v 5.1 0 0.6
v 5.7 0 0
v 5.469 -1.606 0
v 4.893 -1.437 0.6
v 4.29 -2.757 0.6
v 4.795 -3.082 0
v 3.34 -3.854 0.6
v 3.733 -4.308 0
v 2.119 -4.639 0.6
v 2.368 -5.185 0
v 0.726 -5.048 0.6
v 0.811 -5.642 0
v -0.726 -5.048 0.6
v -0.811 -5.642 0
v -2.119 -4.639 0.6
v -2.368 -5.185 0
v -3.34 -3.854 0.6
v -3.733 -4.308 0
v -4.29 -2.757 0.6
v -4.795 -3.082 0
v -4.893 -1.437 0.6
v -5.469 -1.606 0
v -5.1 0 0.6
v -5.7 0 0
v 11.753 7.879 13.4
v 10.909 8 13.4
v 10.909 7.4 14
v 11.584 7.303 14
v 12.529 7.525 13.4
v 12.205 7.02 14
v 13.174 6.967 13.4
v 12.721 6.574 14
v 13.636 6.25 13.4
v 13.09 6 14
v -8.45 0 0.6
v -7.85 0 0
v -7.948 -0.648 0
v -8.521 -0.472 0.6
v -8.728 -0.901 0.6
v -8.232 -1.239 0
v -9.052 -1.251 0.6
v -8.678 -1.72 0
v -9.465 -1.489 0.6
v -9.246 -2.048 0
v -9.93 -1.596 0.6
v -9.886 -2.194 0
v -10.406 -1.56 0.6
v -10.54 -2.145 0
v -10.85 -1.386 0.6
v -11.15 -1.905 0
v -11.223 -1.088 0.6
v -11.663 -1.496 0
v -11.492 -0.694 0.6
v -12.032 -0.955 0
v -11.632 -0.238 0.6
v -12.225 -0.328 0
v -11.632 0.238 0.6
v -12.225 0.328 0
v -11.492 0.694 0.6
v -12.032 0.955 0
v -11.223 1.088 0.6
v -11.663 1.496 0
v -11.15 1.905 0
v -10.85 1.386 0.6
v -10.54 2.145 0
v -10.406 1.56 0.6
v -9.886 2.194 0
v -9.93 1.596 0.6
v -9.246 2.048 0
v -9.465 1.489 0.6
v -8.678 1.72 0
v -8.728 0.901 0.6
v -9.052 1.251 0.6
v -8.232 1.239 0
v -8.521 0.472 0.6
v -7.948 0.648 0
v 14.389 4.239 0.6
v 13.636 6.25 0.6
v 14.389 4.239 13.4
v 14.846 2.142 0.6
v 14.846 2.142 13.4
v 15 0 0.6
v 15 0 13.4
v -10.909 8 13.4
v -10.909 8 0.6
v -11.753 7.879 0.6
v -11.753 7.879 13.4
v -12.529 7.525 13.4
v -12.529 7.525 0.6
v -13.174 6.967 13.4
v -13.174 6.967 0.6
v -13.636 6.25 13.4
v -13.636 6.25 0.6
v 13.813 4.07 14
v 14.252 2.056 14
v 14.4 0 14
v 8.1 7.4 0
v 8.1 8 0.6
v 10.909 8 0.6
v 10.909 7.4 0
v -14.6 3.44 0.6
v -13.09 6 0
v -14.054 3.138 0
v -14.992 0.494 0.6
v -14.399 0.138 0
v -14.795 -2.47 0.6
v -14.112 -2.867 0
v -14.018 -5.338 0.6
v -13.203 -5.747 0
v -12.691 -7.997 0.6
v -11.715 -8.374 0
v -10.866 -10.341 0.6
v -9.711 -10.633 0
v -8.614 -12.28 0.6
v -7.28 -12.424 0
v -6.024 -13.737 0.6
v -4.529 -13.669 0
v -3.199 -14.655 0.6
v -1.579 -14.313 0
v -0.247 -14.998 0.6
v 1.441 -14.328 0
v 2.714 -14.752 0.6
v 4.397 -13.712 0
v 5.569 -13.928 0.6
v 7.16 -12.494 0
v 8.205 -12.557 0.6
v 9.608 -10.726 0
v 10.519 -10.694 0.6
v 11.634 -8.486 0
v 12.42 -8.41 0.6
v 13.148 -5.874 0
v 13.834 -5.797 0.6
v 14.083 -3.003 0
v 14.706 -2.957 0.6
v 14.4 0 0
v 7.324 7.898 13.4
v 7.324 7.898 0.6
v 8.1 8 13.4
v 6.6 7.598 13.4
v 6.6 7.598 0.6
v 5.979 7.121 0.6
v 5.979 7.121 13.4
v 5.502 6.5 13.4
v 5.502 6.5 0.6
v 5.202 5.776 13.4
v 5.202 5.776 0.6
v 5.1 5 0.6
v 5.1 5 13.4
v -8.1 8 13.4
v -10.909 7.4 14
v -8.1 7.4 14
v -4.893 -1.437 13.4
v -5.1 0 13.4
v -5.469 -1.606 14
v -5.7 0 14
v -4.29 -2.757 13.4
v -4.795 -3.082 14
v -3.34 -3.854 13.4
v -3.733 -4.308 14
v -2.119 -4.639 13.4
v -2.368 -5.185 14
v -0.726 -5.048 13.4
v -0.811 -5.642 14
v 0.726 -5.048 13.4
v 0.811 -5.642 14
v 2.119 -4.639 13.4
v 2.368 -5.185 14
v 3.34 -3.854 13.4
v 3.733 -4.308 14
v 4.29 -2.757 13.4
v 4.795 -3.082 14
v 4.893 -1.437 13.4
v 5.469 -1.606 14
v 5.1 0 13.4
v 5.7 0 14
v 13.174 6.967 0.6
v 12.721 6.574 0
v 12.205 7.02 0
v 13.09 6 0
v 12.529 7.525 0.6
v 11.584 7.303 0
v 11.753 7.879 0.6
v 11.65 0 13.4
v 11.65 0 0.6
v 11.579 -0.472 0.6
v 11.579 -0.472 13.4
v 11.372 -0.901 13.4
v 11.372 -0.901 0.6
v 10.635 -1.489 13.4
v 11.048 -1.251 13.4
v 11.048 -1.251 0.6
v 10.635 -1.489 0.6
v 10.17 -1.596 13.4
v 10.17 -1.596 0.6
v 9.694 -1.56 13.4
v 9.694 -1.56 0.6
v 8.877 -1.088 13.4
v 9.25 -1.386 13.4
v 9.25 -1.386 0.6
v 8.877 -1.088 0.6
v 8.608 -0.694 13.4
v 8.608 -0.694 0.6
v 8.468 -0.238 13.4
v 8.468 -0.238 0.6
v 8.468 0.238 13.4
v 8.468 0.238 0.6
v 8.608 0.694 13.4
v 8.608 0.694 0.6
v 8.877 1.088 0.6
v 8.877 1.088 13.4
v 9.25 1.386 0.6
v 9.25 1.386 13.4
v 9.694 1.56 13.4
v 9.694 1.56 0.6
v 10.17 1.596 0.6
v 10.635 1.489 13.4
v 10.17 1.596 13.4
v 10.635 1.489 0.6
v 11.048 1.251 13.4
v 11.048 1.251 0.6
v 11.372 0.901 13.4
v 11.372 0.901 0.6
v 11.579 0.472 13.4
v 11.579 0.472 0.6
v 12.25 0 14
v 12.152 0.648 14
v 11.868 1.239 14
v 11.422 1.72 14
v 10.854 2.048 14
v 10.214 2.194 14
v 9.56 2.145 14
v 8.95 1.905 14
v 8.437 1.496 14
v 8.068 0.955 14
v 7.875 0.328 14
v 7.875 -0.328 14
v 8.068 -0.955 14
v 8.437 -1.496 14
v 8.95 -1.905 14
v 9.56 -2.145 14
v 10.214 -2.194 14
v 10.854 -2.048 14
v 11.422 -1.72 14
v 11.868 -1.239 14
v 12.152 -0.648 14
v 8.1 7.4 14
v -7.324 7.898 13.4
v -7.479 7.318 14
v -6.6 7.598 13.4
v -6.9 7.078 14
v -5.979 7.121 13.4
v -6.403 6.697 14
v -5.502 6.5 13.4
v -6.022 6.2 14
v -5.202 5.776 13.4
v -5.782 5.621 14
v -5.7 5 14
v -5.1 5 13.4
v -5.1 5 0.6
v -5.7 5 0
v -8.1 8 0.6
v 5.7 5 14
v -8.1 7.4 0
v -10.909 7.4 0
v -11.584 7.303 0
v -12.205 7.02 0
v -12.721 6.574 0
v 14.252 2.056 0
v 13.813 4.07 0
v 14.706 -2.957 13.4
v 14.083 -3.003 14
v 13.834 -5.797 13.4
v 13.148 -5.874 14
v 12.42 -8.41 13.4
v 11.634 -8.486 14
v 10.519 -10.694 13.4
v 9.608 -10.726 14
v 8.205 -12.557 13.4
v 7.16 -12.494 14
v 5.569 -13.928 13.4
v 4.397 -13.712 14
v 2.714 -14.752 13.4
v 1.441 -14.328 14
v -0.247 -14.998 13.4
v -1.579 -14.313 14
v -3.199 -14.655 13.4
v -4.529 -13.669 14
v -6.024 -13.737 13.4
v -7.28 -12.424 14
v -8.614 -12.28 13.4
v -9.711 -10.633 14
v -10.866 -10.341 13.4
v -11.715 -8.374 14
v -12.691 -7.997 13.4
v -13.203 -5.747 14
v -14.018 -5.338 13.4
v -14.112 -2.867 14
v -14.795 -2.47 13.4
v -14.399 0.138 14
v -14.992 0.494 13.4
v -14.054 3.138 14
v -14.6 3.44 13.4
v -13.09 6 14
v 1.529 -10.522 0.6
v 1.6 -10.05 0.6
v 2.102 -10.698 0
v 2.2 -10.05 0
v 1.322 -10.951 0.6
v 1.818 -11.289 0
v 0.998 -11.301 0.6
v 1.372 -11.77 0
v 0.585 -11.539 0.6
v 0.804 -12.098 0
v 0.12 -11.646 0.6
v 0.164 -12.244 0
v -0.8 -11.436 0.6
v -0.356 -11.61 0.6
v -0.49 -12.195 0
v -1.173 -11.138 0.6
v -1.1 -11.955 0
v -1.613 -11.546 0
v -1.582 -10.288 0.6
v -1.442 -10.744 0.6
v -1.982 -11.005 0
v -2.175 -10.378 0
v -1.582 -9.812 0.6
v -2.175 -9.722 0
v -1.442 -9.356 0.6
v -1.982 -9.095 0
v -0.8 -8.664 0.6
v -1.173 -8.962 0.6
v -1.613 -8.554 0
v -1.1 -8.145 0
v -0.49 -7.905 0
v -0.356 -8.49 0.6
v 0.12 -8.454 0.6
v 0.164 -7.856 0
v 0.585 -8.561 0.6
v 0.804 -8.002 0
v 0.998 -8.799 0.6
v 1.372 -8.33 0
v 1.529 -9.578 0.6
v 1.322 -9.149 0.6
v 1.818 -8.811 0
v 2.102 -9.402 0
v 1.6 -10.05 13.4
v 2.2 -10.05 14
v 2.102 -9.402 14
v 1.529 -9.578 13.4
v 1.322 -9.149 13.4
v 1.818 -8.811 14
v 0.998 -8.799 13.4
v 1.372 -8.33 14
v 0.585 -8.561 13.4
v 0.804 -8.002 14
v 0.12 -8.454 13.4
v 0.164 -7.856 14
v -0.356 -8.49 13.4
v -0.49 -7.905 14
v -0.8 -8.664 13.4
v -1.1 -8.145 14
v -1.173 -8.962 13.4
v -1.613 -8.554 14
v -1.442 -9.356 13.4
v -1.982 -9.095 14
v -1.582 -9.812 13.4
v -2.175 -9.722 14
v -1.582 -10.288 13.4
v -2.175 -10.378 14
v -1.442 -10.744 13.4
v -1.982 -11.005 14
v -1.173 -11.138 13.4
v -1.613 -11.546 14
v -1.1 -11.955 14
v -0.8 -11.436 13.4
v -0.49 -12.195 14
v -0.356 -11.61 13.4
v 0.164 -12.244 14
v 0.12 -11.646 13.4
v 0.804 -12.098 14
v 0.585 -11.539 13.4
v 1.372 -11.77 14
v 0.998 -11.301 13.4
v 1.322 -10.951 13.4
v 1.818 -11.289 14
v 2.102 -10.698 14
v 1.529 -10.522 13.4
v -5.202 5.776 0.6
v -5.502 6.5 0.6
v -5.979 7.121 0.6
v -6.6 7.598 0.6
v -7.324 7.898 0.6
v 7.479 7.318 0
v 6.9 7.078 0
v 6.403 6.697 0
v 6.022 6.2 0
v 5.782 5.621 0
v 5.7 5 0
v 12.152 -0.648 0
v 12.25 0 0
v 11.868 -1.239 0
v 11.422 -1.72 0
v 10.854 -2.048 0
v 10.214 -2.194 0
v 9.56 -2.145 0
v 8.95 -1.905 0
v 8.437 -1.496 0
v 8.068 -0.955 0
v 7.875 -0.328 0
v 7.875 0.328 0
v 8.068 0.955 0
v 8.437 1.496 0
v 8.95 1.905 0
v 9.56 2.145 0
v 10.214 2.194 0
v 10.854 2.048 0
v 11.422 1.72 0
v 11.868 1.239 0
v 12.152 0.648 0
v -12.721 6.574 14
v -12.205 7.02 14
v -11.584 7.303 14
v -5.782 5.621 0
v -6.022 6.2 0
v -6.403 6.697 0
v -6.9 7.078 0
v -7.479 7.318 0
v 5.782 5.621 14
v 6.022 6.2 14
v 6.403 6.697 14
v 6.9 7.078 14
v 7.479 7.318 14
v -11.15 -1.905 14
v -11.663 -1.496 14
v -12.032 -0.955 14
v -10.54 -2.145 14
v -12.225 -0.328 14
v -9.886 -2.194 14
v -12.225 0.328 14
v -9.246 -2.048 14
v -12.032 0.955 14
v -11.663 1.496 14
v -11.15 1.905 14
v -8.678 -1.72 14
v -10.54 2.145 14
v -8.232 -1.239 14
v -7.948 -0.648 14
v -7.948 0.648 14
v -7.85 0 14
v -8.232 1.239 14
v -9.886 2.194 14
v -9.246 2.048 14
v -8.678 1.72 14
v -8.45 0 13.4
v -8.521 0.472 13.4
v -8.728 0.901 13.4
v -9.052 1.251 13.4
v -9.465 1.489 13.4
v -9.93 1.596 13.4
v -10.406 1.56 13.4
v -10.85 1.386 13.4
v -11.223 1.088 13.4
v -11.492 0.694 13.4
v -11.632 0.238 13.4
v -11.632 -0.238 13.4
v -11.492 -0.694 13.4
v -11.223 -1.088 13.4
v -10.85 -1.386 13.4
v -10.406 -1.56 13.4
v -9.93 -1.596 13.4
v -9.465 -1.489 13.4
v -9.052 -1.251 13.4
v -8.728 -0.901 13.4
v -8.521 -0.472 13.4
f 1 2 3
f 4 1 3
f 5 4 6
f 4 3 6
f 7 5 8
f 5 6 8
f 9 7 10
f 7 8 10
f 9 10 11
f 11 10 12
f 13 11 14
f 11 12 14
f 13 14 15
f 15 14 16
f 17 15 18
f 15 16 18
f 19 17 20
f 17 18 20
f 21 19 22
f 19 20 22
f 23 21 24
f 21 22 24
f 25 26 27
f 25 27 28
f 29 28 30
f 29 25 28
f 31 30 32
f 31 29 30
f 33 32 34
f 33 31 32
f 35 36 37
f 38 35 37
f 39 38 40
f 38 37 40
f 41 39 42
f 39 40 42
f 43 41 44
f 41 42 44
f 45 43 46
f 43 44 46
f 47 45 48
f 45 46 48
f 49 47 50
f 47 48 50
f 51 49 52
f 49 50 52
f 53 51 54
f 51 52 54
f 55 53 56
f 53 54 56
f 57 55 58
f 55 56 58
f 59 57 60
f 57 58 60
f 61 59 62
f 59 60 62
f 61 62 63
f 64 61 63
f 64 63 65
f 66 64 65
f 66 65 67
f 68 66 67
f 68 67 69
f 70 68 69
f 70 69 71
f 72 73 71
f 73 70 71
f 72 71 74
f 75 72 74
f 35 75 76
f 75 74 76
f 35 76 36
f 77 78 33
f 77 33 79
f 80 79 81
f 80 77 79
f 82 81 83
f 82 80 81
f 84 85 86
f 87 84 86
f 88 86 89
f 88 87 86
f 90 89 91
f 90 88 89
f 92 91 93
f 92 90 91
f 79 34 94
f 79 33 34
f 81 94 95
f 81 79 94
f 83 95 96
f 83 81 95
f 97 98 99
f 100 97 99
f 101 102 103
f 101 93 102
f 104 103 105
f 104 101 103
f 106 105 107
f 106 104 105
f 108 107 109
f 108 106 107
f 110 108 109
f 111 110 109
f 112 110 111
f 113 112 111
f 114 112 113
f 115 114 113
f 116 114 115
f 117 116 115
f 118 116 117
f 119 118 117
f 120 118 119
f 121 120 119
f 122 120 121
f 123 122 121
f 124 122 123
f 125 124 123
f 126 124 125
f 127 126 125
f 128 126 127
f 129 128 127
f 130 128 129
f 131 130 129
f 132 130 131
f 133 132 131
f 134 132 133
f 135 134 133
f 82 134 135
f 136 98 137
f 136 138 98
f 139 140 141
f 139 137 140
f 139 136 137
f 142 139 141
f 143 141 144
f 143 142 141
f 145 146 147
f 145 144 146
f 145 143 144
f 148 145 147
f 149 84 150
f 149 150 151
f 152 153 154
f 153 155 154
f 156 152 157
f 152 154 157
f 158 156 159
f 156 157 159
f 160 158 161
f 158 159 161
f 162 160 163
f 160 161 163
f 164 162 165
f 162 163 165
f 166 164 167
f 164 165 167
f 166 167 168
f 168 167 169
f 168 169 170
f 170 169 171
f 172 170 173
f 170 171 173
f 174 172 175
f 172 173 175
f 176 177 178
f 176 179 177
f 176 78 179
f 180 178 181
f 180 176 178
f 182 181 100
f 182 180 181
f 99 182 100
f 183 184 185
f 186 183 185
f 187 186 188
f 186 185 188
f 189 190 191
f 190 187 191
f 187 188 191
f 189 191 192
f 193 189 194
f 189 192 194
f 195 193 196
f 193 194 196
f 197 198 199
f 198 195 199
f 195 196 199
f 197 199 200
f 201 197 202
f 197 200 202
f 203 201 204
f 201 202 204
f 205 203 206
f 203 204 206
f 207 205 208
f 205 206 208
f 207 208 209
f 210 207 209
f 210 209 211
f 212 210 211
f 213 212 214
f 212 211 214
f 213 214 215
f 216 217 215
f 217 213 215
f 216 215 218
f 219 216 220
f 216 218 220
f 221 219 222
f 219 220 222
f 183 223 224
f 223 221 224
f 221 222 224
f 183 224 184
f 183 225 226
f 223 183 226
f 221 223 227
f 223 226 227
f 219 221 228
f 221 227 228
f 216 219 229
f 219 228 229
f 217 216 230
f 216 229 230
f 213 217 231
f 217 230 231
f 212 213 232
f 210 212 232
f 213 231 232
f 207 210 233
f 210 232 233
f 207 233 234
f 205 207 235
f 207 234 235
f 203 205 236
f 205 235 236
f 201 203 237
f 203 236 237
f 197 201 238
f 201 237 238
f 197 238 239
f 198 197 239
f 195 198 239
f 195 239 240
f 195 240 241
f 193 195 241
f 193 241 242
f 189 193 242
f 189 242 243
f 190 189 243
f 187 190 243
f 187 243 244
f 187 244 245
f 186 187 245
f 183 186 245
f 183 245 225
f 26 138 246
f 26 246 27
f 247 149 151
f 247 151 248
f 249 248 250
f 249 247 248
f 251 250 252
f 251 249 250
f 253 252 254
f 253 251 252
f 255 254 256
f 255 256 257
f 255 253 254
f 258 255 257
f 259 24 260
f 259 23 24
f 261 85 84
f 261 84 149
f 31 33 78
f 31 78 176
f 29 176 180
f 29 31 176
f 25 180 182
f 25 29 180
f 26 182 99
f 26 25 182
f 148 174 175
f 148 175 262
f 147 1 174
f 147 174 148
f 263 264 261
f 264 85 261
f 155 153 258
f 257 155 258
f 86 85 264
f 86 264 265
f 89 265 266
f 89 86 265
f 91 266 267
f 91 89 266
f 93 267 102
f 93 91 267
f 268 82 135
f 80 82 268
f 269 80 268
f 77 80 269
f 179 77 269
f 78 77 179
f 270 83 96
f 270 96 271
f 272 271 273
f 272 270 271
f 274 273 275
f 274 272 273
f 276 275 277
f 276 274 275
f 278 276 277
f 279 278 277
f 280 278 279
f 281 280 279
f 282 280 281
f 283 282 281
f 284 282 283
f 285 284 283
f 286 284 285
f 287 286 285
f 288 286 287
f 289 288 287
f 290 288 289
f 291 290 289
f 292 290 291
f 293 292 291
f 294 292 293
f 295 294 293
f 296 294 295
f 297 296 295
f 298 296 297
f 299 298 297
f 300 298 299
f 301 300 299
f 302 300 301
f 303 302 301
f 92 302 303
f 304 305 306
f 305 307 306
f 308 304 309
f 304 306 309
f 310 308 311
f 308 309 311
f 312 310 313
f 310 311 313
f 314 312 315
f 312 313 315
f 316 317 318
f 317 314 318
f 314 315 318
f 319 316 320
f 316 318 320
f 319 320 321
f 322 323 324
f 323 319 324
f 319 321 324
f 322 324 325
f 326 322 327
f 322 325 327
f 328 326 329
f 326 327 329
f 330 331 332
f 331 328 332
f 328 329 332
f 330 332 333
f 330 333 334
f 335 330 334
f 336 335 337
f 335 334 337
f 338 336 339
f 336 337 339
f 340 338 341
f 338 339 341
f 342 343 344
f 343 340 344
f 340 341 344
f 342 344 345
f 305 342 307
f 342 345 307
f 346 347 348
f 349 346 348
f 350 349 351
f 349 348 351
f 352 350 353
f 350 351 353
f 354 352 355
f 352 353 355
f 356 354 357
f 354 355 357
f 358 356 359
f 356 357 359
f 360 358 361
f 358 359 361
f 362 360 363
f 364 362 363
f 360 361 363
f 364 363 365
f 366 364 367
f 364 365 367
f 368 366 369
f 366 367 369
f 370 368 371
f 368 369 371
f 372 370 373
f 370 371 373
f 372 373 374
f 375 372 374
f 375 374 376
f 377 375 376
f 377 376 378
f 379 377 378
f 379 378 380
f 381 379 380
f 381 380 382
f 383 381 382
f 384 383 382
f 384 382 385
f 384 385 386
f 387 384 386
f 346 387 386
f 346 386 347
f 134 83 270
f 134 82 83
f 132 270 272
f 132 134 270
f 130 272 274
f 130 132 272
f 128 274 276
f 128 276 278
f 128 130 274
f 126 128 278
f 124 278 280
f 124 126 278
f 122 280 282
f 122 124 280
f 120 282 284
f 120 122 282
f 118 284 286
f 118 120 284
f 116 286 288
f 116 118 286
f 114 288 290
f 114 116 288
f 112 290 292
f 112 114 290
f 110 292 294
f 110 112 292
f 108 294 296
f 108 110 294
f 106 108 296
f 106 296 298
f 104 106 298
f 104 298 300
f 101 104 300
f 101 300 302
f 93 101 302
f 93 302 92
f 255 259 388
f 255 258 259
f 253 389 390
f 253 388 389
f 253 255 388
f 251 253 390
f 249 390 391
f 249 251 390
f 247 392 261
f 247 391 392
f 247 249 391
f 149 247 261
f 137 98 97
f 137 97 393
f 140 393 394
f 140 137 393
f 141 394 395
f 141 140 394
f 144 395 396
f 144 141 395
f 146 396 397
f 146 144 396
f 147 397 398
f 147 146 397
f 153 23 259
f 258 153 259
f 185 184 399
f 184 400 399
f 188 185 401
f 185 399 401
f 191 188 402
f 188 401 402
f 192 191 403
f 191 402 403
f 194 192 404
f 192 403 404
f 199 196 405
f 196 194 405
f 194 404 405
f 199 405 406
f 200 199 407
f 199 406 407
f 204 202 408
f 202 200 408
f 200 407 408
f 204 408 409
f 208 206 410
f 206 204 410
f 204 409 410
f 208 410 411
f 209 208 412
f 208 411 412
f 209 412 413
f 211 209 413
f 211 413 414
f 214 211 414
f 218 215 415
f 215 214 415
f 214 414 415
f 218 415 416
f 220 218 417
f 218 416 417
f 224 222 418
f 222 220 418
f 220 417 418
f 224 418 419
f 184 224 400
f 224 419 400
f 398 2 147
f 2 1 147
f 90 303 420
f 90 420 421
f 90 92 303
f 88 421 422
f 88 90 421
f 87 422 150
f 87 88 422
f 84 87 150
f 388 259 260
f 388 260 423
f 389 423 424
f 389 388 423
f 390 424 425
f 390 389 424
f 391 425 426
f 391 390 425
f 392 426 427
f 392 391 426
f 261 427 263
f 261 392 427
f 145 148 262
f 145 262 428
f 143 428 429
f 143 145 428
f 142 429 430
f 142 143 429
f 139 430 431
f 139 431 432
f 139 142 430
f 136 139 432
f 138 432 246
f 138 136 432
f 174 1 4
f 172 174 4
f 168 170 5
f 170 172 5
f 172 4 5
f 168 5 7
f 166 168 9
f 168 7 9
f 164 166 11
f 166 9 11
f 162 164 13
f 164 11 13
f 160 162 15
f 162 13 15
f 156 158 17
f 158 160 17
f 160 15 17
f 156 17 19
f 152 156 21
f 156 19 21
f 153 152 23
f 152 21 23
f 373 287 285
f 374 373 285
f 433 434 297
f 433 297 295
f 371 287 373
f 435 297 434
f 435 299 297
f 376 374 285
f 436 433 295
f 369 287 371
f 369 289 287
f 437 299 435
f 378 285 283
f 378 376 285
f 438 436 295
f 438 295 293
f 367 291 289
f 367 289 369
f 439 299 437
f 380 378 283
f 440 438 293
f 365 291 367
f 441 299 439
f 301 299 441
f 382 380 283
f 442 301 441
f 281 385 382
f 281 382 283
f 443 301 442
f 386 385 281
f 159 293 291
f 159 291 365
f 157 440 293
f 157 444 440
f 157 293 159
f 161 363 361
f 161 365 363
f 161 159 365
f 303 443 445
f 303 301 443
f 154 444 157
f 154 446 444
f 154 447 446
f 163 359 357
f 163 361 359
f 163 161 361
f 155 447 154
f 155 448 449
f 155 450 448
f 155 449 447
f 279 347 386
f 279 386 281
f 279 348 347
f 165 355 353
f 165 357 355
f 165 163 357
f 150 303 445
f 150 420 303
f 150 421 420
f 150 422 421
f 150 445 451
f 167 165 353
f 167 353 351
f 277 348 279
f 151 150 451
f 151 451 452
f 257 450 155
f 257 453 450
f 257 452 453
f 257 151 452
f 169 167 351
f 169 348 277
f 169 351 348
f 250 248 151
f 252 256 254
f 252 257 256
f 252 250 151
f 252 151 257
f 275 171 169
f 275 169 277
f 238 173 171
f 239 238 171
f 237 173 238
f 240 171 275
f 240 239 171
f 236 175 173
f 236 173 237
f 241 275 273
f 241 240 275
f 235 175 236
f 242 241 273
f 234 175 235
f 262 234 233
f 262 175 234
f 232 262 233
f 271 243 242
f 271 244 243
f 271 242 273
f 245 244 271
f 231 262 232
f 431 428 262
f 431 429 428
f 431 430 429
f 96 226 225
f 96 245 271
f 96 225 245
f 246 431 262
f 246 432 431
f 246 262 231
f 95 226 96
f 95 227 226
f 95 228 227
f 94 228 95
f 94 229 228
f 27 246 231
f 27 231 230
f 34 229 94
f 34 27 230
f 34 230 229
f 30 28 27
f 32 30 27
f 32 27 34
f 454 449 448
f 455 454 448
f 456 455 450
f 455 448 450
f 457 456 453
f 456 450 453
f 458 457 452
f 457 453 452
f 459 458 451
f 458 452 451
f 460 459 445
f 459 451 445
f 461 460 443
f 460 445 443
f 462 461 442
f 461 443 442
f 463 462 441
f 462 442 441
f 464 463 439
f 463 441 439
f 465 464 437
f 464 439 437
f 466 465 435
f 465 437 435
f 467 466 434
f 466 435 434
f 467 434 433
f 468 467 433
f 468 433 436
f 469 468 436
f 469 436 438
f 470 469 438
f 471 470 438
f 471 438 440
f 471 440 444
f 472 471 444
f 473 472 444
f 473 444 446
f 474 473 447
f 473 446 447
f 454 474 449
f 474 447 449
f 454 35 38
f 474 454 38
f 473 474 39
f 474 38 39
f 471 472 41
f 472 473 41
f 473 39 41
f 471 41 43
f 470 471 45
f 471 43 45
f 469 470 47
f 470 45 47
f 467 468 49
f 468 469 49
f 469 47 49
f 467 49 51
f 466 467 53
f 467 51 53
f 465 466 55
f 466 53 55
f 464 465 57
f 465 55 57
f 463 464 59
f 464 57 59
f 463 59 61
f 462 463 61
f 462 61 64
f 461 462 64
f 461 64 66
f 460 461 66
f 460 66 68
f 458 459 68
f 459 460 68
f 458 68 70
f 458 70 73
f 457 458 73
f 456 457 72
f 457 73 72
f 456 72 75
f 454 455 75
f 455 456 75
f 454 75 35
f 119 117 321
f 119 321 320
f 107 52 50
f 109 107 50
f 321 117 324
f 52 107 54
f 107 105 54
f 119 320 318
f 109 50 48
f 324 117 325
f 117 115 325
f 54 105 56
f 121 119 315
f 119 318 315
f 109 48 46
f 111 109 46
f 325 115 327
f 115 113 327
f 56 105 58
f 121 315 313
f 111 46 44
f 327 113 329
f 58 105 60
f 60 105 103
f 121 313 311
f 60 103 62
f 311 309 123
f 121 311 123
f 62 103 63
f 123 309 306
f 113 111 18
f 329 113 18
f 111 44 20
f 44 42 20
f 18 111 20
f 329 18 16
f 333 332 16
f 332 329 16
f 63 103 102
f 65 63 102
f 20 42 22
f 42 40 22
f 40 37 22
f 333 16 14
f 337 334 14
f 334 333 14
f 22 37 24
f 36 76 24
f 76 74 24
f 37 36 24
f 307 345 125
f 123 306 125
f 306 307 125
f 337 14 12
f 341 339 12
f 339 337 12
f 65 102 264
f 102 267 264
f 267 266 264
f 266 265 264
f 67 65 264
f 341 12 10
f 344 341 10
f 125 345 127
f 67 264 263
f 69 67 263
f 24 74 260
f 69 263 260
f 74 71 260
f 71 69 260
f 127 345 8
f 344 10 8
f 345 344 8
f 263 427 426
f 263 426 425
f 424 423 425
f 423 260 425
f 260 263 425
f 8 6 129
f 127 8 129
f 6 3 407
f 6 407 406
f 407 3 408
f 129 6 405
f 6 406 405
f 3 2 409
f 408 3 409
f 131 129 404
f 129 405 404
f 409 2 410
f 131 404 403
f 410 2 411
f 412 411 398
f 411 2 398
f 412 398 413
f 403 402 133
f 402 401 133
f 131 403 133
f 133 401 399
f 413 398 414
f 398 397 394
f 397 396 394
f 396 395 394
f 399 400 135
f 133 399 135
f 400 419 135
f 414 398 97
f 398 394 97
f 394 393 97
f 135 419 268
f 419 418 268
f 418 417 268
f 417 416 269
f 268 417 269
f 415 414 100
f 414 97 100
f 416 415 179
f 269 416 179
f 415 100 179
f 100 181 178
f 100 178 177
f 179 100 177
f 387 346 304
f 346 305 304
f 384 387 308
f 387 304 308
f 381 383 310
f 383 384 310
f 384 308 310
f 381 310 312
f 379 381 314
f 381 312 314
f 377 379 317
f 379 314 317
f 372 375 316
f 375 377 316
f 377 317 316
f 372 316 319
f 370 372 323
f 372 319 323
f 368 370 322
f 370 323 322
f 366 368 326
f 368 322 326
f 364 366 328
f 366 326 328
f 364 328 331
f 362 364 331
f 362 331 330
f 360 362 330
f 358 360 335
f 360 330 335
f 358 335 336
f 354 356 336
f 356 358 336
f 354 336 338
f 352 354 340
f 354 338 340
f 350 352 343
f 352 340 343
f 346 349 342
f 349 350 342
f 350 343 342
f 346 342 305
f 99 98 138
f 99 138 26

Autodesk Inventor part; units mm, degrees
ref_plane "YZ Plane" through (0, 0, 0) normal (1, 0, 0) x (0, 1, 0)
ref_plane "XZ Plane" through (0, 0, 0) normal (0, 1, 0) x (-1, 0, 0)
ref_plane "XY Plane" through (0, 0, 0) normal (0, 0, 1) x (1, 0, 0)
sketch "Эскиз1" plane through (0, 0, 0) normal (0, 0, 1) x (1, 0, 0)
  circle A0 centre (0, 0) radius 5.1
  circle A1 centre (0, 0) radius 15
  line L0 (0, -21) -> (0, 21) construction
  line L1 (-21, 0) -> (21, 0) construction
  circle A2 centre (0, 0) radius 10.05 construction
  circle A3 centre (-10.05, 0) radius 1.6
  circle A4 centre (0, -10.05) radius 1.6
  circle A5 centre (10.05, 0) radius 1.6
  line L2 (-12.6886, 8) -> (12.6886, 8)
  line L3 (-5.1, 0) -> (-5.1, 8)
  line L4 (5.1, 0) -> (5.1, 8)
  dimension "d0" = 10.2
  dimension "d1" = 30
  dimension "d2" = 20.1
  dimension "d3" = 3.2
  dimension "d4" = 8
extrude "Выдавливание1" add sketch "Эскиз1" along normal blind 14 contours L4 L2 A1 L3 A0
fillet "Сопряжение1" radius 3 4 edges at (-12.6886, 8, 7) (-5.1, 8, 7) (5.1, 8, 7) (12.6886, 8, 7)
chamfer "Фаска1" distance 0.6 angle 45 26 edges at (-5.9787, 7.1213, 14) (-5.1, 2.5, 14) (0, -5.1, 14) (5.1, 2.5, 14) (5.9787, 7.1213, 14) (9.5044, 8, 14) (12.5289, 7.5249, 14) (0, -15, 14) (-12.5289, 7.5249, 14) (-9.5044, 8, 14) (-11.65, 0, 14) (-1.6, -10.05, 14) (8.45, 0, 14) (0, -5.1, 0) (-5.1, 2.5, 0) (-5.9787, 7.1213, 0) (-9.5044, 8, 0) (-12.5289, 7.5249, 0) (0, -15, 0) (12.5289, 7.5249, 0) (9.5044, 8, 0) (5.9787, 7.1213, 0) (5.1, 2.5, 0) (-11.65, 0, 0) (-1.6, -10.05, 0) (8.45, 0, 0)
equation "\"d2\" = 0.5 * d0 + 0.5 * d1"
properties part number "Проставка катушки правая"
